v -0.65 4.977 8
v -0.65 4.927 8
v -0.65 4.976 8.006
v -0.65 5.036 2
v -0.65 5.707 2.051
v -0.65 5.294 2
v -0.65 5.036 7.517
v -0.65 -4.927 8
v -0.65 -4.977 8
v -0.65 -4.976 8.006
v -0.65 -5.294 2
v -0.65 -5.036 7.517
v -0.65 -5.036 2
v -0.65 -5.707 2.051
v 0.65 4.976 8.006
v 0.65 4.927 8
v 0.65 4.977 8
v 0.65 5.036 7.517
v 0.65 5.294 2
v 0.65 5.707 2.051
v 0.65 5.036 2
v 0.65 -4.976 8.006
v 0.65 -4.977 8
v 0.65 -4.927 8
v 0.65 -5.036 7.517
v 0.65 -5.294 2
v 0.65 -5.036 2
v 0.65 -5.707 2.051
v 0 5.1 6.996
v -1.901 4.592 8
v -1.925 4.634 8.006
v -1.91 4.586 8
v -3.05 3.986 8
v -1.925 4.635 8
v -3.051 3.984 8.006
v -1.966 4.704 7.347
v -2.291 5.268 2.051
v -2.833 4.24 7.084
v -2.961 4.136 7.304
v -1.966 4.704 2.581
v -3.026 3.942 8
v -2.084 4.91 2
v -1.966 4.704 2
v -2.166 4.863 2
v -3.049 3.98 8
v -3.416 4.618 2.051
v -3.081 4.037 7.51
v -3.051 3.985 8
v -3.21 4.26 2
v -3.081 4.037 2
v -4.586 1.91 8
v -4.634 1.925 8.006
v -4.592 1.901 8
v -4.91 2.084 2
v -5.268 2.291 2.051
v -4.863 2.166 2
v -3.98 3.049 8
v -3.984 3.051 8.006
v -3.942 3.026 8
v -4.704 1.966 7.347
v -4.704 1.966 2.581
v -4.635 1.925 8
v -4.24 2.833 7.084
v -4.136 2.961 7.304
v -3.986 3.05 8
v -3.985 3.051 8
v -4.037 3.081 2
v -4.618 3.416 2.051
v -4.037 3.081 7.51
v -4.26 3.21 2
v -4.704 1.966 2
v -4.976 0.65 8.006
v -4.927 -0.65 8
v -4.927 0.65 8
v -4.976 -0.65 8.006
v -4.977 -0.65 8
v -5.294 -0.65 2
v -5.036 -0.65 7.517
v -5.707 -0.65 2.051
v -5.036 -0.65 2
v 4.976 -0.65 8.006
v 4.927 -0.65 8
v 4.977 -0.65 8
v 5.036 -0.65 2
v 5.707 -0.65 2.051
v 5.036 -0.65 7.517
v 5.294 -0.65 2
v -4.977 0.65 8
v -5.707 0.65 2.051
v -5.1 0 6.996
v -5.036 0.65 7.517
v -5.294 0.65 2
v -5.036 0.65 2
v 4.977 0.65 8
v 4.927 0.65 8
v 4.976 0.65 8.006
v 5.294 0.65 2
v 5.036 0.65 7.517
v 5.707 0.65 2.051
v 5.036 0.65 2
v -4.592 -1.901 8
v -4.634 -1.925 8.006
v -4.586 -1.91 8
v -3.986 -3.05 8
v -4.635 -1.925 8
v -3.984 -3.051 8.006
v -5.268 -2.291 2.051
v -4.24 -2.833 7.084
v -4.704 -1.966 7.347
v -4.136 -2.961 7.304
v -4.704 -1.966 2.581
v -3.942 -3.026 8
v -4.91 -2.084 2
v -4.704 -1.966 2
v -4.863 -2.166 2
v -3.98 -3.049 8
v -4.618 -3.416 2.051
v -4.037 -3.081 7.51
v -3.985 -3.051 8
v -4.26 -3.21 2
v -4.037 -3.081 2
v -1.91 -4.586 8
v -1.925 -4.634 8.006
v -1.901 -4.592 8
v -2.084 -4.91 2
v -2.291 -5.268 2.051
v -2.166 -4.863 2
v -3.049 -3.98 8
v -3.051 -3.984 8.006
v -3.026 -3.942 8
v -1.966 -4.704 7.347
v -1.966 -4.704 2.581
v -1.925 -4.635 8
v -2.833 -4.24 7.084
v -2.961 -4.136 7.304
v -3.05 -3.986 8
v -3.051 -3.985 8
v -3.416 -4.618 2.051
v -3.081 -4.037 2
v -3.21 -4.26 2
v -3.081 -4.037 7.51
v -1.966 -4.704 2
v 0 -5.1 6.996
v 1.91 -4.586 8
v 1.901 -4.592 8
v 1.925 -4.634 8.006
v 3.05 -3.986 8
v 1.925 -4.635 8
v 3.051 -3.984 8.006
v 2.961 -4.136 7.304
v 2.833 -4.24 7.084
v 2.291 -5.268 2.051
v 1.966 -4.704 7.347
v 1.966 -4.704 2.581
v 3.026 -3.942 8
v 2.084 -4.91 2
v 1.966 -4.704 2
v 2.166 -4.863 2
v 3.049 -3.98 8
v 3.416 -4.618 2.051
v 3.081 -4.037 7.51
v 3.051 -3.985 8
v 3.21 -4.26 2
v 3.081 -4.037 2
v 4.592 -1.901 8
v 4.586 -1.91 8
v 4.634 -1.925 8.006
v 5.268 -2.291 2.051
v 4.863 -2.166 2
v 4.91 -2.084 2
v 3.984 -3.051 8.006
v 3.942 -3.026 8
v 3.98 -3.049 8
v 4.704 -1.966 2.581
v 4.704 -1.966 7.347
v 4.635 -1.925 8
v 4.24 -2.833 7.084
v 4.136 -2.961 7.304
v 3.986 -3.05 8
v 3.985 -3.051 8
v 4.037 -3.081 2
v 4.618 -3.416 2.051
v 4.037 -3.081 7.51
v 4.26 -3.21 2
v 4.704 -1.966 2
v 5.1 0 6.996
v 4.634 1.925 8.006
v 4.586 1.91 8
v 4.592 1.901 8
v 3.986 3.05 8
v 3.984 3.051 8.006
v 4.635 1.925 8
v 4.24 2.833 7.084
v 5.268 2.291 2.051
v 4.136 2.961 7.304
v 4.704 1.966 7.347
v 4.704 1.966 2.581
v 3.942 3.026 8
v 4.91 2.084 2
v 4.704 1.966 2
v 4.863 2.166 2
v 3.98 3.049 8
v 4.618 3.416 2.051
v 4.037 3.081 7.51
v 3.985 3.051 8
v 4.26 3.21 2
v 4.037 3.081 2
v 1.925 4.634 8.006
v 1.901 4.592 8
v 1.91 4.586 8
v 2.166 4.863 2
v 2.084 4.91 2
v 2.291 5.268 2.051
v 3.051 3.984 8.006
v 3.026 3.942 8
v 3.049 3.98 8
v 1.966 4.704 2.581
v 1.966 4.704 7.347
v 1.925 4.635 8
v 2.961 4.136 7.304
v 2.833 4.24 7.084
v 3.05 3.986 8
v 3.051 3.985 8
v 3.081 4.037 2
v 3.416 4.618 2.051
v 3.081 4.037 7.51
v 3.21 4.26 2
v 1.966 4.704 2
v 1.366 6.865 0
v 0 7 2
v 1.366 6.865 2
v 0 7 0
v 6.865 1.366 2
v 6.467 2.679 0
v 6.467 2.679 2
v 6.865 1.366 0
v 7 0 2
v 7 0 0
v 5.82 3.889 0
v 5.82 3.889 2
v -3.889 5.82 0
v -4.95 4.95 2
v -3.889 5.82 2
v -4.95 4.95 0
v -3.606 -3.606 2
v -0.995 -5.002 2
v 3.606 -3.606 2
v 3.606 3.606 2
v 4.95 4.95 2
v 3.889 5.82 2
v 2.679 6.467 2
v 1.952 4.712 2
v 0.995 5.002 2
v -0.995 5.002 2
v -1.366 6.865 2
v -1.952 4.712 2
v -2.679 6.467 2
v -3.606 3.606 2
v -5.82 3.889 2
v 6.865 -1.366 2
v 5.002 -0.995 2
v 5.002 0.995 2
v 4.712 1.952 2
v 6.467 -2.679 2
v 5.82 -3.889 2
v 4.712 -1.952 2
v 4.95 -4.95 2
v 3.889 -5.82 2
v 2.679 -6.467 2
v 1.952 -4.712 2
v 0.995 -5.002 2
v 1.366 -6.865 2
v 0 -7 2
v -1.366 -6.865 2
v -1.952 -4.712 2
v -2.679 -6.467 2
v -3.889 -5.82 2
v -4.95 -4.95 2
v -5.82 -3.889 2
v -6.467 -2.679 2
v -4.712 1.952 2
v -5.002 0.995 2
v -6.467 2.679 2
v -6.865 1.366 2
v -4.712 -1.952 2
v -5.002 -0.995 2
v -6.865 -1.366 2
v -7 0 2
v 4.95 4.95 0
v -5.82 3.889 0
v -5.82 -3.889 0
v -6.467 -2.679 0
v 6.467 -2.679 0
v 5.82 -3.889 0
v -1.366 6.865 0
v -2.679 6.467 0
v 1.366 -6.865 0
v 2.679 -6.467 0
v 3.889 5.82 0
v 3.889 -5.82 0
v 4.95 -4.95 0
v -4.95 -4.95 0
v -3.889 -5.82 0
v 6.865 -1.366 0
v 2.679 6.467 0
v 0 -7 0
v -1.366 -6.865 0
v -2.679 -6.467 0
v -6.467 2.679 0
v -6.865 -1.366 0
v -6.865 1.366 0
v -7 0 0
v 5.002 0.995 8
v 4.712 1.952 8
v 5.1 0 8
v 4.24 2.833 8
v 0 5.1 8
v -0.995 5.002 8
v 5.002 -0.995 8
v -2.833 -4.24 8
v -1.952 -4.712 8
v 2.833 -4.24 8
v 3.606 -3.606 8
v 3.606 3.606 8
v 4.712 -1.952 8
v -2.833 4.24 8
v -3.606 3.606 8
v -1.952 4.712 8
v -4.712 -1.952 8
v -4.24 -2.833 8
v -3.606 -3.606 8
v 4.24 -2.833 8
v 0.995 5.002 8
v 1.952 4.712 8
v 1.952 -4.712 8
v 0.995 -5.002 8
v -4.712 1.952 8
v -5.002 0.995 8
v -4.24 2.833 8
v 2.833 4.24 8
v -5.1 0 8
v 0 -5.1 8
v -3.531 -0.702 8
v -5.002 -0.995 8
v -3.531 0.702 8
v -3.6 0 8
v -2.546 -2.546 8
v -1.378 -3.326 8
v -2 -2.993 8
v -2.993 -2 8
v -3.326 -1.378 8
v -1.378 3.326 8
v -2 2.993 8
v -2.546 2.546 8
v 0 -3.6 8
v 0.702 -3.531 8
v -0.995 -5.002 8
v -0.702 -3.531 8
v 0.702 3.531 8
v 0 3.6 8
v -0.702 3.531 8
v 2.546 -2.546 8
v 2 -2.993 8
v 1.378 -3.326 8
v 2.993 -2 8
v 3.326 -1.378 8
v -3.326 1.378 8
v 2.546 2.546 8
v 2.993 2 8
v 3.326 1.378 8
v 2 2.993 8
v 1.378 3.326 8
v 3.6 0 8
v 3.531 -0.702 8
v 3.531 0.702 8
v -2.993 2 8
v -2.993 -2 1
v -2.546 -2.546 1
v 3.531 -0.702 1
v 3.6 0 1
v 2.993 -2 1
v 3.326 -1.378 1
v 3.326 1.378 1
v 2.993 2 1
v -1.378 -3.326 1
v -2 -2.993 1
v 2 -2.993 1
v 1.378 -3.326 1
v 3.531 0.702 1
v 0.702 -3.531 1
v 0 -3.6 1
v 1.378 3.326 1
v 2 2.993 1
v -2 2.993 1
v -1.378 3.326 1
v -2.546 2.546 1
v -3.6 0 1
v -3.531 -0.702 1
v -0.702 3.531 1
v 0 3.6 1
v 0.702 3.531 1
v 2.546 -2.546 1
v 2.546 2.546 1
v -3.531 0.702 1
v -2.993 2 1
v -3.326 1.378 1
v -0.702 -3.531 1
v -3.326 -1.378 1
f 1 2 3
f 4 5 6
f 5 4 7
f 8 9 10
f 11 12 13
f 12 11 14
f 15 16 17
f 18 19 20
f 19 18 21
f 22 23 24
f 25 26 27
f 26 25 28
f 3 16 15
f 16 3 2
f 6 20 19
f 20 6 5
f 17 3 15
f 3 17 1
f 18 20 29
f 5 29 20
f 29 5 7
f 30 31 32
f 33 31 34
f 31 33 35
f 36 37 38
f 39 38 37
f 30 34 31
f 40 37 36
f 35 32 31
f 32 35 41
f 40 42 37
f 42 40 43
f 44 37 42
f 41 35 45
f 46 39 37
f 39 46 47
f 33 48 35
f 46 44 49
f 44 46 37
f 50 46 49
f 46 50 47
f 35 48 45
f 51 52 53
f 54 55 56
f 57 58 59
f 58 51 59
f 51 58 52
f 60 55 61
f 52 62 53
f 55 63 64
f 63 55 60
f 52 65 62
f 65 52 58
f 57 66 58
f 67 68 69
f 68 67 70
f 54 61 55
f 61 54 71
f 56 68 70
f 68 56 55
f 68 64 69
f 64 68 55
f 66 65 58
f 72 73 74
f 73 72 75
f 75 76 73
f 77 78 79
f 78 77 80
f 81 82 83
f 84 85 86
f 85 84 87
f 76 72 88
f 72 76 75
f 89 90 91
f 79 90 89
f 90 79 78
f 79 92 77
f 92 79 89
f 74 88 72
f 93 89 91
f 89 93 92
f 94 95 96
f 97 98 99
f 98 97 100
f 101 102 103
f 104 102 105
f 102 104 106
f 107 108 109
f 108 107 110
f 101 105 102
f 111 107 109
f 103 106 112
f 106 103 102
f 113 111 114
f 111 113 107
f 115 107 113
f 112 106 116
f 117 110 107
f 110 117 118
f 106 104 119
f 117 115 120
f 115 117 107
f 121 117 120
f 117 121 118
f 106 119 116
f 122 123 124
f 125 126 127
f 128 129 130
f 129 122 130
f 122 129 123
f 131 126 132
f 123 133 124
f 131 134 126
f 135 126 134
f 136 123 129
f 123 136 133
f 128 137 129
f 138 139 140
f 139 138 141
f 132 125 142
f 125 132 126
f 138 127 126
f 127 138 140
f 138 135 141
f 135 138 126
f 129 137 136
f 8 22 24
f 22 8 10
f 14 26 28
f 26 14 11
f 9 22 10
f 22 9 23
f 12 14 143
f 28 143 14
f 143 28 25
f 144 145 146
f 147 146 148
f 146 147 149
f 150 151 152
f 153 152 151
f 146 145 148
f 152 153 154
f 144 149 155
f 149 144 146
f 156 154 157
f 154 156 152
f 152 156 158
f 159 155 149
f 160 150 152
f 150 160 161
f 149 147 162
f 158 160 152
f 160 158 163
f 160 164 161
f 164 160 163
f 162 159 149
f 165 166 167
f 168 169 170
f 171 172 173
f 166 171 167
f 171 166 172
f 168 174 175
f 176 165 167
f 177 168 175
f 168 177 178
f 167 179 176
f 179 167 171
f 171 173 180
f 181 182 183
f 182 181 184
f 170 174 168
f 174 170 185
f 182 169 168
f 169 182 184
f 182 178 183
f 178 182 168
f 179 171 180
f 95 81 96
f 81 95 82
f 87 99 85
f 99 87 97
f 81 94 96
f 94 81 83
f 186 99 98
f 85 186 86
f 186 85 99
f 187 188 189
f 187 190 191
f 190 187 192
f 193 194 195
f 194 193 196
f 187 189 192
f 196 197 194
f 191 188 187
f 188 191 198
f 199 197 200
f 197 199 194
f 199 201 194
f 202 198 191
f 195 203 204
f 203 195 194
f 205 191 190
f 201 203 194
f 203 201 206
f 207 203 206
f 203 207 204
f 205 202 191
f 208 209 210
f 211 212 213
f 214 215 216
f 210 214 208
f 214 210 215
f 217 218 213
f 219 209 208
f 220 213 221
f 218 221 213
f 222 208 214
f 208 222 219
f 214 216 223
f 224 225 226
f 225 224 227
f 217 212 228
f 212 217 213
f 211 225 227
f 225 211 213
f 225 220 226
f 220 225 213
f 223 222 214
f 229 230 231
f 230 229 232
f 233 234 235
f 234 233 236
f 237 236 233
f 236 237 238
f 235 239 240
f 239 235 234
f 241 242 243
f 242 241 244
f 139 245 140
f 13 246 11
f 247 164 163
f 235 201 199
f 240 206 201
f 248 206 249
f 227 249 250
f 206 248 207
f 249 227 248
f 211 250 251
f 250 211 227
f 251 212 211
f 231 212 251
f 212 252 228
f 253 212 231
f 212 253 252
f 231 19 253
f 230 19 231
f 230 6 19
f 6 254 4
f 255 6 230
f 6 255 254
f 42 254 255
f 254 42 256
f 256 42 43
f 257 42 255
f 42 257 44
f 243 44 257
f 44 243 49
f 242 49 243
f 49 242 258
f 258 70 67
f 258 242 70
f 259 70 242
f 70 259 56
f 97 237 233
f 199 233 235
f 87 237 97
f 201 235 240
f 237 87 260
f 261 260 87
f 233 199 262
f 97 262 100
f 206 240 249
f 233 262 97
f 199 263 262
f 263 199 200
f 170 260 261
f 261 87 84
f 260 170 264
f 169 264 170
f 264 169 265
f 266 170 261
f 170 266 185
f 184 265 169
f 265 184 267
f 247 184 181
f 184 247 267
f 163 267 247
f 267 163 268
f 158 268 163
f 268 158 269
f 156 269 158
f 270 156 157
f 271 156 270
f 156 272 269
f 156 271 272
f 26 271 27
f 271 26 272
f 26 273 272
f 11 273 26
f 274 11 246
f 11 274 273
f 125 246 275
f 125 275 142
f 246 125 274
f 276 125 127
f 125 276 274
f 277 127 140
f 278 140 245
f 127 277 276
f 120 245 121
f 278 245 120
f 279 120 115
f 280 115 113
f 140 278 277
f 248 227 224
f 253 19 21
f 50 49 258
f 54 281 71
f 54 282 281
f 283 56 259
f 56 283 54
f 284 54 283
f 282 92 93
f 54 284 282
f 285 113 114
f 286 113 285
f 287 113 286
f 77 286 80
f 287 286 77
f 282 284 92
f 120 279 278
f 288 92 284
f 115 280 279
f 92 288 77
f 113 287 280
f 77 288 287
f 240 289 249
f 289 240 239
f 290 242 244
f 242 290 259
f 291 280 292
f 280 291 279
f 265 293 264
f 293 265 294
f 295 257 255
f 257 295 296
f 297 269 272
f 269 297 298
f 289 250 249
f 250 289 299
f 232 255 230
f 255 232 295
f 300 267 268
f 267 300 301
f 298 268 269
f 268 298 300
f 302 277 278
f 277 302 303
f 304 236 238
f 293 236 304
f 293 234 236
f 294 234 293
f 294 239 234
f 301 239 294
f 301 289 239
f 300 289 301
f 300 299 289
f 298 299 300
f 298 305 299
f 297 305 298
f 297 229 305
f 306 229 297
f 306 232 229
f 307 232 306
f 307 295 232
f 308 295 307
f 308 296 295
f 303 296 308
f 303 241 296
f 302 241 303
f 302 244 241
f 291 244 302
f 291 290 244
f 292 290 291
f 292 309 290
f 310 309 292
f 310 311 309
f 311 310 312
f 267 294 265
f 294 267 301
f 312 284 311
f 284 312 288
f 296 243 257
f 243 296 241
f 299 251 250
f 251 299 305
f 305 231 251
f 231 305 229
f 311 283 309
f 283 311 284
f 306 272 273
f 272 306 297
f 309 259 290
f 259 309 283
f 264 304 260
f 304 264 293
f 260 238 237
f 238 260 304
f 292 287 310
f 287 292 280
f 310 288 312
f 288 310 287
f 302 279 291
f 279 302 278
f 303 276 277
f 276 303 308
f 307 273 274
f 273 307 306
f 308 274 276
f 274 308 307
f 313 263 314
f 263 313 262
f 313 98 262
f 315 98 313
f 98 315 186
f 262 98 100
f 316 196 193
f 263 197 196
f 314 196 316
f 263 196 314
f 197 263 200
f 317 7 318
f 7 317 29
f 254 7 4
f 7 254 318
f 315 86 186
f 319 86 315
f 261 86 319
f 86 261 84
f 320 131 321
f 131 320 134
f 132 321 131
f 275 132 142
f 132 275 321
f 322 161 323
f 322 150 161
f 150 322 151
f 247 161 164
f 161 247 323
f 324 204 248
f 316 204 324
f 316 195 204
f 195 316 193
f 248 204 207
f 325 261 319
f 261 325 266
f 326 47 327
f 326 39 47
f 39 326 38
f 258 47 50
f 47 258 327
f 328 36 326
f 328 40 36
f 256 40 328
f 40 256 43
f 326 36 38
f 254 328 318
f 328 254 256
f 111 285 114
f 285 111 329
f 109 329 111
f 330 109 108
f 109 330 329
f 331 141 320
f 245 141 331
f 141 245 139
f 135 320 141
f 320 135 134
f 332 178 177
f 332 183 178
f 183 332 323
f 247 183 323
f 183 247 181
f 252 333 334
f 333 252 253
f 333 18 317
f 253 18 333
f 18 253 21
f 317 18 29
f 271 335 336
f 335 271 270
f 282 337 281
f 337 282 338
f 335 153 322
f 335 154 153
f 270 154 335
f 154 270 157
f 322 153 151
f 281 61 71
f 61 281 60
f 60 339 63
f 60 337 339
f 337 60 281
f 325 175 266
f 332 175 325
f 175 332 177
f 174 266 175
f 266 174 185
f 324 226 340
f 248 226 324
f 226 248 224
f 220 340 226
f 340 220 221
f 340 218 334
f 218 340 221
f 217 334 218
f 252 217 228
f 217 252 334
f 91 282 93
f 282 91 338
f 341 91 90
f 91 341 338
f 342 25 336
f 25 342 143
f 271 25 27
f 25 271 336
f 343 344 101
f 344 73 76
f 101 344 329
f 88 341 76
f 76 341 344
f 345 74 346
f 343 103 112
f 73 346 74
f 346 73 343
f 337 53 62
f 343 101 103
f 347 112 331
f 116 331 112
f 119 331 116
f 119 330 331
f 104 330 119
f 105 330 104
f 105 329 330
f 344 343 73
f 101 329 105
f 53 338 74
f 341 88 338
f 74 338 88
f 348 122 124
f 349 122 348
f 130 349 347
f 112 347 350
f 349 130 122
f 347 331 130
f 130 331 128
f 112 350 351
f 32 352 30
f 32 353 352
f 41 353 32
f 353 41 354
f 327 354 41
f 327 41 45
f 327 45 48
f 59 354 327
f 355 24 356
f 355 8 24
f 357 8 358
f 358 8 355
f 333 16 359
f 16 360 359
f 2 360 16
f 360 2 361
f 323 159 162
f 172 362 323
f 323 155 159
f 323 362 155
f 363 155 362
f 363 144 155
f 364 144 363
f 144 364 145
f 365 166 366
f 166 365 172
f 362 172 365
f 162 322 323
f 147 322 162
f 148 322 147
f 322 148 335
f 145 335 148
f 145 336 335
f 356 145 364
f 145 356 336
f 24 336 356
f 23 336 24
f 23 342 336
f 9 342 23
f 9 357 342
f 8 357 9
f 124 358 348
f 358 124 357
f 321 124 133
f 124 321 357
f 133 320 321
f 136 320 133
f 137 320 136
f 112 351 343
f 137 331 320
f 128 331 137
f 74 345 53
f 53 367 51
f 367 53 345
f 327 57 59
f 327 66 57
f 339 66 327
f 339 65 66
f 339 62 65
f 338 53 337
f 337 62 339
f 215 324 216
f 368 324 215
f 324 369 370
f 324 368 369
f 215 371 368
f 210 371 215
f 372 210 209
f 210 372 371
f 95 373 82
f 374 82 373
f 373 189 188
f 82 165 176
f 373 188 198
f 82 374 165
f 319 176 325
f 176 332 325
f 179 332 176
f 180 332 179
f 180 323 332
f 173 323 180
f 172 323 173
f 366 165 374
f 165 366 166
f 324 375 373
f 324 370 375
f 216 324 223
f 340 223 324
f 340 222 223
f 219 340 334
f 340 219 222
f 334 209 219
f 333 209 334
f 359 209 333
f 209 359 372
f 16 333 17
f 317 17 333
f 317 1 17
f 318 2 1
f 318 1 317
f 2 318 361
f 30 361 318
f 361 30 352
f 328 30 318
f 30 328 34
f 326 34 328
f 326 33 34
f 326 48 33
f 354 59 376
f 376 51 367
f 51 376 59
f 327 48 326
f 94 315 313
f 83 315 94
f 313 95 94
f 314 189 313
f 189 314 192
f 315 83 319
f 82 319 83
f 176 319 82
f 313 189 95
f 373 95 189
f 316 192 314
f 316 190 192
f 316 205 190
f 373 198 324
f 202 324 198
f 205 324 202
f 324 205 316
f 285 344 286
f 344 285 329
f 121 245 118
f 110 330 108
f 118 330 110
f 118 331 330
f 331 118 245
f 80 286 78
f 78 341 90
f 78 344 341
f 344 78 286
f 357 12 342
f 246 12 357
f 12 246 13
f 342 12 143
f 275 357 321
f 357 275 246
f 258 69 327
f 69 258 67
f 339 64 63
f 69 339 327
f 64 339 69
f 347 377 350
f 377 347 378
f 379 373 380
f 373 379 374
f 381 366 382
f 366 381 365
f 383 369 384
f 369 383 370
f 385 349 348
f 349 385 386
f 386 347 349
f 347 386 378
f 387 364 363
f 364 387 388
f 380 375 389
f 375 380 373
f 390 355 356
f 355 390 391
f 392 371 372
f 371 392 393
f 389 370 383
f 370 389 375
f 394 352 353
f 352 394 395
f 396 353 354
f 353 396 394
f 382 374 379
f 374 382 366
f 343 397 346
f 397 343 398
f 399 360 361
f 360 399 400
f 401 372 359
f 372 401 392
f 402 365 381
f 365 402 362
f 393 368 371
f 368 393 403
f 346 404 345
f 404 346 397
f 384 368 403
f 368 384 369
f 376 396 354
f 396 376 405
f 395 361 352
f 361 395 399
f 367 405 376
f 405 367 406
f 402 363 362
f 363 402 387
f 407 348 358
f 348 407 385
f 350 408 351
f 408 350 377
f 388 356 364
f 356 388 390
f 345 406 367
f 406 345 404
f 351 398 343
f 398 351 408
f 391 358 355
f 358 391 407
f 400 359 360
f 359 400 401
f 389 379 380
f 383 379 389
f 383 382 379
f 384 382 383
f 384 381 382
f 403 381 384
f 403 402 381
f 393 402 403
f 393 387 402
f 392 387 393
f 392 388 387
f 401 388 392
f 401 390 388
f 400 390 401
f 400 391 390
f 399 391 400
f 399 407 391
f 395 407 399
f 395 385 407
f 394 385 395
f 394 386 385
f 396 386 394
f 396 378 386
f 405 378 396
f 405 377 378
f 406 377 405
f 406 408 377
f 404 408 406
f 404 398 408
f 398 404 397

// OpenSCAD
// Inside Diameter
id=10.2;

// Plug Depth
plug_height=6;

// Cap Diameter
od=14;

// Cap Height
cap_height=2;

// Plug Wall Thickness
t=1.5;

// Tooth Thickness
tooth_width=1.3;

// Tooth Protuberance
tooth_protube=0.65;

$fn=32;

module plug() {
  difference() {
    union() {
      cylinder(d=od, h=cap_height);

      translate([0, 0, cap_height])
        cylinder(d=id, h=plug_height);

      translate([0, 0, cap_height-tooth_width/2])
        for(i=[0:30:360]) {
          echo(i);
          rotate([7, 0, i])
            translate([-tooth_width/2, 0, 0])
            cube([tooth_width, id/2+tooth_protube, plug_height]);
        }
    }

    translate([0, 0, cap_height-1])
      cylinder(d=id-t*2, h=plug_height+1);
  }
}

plug();
